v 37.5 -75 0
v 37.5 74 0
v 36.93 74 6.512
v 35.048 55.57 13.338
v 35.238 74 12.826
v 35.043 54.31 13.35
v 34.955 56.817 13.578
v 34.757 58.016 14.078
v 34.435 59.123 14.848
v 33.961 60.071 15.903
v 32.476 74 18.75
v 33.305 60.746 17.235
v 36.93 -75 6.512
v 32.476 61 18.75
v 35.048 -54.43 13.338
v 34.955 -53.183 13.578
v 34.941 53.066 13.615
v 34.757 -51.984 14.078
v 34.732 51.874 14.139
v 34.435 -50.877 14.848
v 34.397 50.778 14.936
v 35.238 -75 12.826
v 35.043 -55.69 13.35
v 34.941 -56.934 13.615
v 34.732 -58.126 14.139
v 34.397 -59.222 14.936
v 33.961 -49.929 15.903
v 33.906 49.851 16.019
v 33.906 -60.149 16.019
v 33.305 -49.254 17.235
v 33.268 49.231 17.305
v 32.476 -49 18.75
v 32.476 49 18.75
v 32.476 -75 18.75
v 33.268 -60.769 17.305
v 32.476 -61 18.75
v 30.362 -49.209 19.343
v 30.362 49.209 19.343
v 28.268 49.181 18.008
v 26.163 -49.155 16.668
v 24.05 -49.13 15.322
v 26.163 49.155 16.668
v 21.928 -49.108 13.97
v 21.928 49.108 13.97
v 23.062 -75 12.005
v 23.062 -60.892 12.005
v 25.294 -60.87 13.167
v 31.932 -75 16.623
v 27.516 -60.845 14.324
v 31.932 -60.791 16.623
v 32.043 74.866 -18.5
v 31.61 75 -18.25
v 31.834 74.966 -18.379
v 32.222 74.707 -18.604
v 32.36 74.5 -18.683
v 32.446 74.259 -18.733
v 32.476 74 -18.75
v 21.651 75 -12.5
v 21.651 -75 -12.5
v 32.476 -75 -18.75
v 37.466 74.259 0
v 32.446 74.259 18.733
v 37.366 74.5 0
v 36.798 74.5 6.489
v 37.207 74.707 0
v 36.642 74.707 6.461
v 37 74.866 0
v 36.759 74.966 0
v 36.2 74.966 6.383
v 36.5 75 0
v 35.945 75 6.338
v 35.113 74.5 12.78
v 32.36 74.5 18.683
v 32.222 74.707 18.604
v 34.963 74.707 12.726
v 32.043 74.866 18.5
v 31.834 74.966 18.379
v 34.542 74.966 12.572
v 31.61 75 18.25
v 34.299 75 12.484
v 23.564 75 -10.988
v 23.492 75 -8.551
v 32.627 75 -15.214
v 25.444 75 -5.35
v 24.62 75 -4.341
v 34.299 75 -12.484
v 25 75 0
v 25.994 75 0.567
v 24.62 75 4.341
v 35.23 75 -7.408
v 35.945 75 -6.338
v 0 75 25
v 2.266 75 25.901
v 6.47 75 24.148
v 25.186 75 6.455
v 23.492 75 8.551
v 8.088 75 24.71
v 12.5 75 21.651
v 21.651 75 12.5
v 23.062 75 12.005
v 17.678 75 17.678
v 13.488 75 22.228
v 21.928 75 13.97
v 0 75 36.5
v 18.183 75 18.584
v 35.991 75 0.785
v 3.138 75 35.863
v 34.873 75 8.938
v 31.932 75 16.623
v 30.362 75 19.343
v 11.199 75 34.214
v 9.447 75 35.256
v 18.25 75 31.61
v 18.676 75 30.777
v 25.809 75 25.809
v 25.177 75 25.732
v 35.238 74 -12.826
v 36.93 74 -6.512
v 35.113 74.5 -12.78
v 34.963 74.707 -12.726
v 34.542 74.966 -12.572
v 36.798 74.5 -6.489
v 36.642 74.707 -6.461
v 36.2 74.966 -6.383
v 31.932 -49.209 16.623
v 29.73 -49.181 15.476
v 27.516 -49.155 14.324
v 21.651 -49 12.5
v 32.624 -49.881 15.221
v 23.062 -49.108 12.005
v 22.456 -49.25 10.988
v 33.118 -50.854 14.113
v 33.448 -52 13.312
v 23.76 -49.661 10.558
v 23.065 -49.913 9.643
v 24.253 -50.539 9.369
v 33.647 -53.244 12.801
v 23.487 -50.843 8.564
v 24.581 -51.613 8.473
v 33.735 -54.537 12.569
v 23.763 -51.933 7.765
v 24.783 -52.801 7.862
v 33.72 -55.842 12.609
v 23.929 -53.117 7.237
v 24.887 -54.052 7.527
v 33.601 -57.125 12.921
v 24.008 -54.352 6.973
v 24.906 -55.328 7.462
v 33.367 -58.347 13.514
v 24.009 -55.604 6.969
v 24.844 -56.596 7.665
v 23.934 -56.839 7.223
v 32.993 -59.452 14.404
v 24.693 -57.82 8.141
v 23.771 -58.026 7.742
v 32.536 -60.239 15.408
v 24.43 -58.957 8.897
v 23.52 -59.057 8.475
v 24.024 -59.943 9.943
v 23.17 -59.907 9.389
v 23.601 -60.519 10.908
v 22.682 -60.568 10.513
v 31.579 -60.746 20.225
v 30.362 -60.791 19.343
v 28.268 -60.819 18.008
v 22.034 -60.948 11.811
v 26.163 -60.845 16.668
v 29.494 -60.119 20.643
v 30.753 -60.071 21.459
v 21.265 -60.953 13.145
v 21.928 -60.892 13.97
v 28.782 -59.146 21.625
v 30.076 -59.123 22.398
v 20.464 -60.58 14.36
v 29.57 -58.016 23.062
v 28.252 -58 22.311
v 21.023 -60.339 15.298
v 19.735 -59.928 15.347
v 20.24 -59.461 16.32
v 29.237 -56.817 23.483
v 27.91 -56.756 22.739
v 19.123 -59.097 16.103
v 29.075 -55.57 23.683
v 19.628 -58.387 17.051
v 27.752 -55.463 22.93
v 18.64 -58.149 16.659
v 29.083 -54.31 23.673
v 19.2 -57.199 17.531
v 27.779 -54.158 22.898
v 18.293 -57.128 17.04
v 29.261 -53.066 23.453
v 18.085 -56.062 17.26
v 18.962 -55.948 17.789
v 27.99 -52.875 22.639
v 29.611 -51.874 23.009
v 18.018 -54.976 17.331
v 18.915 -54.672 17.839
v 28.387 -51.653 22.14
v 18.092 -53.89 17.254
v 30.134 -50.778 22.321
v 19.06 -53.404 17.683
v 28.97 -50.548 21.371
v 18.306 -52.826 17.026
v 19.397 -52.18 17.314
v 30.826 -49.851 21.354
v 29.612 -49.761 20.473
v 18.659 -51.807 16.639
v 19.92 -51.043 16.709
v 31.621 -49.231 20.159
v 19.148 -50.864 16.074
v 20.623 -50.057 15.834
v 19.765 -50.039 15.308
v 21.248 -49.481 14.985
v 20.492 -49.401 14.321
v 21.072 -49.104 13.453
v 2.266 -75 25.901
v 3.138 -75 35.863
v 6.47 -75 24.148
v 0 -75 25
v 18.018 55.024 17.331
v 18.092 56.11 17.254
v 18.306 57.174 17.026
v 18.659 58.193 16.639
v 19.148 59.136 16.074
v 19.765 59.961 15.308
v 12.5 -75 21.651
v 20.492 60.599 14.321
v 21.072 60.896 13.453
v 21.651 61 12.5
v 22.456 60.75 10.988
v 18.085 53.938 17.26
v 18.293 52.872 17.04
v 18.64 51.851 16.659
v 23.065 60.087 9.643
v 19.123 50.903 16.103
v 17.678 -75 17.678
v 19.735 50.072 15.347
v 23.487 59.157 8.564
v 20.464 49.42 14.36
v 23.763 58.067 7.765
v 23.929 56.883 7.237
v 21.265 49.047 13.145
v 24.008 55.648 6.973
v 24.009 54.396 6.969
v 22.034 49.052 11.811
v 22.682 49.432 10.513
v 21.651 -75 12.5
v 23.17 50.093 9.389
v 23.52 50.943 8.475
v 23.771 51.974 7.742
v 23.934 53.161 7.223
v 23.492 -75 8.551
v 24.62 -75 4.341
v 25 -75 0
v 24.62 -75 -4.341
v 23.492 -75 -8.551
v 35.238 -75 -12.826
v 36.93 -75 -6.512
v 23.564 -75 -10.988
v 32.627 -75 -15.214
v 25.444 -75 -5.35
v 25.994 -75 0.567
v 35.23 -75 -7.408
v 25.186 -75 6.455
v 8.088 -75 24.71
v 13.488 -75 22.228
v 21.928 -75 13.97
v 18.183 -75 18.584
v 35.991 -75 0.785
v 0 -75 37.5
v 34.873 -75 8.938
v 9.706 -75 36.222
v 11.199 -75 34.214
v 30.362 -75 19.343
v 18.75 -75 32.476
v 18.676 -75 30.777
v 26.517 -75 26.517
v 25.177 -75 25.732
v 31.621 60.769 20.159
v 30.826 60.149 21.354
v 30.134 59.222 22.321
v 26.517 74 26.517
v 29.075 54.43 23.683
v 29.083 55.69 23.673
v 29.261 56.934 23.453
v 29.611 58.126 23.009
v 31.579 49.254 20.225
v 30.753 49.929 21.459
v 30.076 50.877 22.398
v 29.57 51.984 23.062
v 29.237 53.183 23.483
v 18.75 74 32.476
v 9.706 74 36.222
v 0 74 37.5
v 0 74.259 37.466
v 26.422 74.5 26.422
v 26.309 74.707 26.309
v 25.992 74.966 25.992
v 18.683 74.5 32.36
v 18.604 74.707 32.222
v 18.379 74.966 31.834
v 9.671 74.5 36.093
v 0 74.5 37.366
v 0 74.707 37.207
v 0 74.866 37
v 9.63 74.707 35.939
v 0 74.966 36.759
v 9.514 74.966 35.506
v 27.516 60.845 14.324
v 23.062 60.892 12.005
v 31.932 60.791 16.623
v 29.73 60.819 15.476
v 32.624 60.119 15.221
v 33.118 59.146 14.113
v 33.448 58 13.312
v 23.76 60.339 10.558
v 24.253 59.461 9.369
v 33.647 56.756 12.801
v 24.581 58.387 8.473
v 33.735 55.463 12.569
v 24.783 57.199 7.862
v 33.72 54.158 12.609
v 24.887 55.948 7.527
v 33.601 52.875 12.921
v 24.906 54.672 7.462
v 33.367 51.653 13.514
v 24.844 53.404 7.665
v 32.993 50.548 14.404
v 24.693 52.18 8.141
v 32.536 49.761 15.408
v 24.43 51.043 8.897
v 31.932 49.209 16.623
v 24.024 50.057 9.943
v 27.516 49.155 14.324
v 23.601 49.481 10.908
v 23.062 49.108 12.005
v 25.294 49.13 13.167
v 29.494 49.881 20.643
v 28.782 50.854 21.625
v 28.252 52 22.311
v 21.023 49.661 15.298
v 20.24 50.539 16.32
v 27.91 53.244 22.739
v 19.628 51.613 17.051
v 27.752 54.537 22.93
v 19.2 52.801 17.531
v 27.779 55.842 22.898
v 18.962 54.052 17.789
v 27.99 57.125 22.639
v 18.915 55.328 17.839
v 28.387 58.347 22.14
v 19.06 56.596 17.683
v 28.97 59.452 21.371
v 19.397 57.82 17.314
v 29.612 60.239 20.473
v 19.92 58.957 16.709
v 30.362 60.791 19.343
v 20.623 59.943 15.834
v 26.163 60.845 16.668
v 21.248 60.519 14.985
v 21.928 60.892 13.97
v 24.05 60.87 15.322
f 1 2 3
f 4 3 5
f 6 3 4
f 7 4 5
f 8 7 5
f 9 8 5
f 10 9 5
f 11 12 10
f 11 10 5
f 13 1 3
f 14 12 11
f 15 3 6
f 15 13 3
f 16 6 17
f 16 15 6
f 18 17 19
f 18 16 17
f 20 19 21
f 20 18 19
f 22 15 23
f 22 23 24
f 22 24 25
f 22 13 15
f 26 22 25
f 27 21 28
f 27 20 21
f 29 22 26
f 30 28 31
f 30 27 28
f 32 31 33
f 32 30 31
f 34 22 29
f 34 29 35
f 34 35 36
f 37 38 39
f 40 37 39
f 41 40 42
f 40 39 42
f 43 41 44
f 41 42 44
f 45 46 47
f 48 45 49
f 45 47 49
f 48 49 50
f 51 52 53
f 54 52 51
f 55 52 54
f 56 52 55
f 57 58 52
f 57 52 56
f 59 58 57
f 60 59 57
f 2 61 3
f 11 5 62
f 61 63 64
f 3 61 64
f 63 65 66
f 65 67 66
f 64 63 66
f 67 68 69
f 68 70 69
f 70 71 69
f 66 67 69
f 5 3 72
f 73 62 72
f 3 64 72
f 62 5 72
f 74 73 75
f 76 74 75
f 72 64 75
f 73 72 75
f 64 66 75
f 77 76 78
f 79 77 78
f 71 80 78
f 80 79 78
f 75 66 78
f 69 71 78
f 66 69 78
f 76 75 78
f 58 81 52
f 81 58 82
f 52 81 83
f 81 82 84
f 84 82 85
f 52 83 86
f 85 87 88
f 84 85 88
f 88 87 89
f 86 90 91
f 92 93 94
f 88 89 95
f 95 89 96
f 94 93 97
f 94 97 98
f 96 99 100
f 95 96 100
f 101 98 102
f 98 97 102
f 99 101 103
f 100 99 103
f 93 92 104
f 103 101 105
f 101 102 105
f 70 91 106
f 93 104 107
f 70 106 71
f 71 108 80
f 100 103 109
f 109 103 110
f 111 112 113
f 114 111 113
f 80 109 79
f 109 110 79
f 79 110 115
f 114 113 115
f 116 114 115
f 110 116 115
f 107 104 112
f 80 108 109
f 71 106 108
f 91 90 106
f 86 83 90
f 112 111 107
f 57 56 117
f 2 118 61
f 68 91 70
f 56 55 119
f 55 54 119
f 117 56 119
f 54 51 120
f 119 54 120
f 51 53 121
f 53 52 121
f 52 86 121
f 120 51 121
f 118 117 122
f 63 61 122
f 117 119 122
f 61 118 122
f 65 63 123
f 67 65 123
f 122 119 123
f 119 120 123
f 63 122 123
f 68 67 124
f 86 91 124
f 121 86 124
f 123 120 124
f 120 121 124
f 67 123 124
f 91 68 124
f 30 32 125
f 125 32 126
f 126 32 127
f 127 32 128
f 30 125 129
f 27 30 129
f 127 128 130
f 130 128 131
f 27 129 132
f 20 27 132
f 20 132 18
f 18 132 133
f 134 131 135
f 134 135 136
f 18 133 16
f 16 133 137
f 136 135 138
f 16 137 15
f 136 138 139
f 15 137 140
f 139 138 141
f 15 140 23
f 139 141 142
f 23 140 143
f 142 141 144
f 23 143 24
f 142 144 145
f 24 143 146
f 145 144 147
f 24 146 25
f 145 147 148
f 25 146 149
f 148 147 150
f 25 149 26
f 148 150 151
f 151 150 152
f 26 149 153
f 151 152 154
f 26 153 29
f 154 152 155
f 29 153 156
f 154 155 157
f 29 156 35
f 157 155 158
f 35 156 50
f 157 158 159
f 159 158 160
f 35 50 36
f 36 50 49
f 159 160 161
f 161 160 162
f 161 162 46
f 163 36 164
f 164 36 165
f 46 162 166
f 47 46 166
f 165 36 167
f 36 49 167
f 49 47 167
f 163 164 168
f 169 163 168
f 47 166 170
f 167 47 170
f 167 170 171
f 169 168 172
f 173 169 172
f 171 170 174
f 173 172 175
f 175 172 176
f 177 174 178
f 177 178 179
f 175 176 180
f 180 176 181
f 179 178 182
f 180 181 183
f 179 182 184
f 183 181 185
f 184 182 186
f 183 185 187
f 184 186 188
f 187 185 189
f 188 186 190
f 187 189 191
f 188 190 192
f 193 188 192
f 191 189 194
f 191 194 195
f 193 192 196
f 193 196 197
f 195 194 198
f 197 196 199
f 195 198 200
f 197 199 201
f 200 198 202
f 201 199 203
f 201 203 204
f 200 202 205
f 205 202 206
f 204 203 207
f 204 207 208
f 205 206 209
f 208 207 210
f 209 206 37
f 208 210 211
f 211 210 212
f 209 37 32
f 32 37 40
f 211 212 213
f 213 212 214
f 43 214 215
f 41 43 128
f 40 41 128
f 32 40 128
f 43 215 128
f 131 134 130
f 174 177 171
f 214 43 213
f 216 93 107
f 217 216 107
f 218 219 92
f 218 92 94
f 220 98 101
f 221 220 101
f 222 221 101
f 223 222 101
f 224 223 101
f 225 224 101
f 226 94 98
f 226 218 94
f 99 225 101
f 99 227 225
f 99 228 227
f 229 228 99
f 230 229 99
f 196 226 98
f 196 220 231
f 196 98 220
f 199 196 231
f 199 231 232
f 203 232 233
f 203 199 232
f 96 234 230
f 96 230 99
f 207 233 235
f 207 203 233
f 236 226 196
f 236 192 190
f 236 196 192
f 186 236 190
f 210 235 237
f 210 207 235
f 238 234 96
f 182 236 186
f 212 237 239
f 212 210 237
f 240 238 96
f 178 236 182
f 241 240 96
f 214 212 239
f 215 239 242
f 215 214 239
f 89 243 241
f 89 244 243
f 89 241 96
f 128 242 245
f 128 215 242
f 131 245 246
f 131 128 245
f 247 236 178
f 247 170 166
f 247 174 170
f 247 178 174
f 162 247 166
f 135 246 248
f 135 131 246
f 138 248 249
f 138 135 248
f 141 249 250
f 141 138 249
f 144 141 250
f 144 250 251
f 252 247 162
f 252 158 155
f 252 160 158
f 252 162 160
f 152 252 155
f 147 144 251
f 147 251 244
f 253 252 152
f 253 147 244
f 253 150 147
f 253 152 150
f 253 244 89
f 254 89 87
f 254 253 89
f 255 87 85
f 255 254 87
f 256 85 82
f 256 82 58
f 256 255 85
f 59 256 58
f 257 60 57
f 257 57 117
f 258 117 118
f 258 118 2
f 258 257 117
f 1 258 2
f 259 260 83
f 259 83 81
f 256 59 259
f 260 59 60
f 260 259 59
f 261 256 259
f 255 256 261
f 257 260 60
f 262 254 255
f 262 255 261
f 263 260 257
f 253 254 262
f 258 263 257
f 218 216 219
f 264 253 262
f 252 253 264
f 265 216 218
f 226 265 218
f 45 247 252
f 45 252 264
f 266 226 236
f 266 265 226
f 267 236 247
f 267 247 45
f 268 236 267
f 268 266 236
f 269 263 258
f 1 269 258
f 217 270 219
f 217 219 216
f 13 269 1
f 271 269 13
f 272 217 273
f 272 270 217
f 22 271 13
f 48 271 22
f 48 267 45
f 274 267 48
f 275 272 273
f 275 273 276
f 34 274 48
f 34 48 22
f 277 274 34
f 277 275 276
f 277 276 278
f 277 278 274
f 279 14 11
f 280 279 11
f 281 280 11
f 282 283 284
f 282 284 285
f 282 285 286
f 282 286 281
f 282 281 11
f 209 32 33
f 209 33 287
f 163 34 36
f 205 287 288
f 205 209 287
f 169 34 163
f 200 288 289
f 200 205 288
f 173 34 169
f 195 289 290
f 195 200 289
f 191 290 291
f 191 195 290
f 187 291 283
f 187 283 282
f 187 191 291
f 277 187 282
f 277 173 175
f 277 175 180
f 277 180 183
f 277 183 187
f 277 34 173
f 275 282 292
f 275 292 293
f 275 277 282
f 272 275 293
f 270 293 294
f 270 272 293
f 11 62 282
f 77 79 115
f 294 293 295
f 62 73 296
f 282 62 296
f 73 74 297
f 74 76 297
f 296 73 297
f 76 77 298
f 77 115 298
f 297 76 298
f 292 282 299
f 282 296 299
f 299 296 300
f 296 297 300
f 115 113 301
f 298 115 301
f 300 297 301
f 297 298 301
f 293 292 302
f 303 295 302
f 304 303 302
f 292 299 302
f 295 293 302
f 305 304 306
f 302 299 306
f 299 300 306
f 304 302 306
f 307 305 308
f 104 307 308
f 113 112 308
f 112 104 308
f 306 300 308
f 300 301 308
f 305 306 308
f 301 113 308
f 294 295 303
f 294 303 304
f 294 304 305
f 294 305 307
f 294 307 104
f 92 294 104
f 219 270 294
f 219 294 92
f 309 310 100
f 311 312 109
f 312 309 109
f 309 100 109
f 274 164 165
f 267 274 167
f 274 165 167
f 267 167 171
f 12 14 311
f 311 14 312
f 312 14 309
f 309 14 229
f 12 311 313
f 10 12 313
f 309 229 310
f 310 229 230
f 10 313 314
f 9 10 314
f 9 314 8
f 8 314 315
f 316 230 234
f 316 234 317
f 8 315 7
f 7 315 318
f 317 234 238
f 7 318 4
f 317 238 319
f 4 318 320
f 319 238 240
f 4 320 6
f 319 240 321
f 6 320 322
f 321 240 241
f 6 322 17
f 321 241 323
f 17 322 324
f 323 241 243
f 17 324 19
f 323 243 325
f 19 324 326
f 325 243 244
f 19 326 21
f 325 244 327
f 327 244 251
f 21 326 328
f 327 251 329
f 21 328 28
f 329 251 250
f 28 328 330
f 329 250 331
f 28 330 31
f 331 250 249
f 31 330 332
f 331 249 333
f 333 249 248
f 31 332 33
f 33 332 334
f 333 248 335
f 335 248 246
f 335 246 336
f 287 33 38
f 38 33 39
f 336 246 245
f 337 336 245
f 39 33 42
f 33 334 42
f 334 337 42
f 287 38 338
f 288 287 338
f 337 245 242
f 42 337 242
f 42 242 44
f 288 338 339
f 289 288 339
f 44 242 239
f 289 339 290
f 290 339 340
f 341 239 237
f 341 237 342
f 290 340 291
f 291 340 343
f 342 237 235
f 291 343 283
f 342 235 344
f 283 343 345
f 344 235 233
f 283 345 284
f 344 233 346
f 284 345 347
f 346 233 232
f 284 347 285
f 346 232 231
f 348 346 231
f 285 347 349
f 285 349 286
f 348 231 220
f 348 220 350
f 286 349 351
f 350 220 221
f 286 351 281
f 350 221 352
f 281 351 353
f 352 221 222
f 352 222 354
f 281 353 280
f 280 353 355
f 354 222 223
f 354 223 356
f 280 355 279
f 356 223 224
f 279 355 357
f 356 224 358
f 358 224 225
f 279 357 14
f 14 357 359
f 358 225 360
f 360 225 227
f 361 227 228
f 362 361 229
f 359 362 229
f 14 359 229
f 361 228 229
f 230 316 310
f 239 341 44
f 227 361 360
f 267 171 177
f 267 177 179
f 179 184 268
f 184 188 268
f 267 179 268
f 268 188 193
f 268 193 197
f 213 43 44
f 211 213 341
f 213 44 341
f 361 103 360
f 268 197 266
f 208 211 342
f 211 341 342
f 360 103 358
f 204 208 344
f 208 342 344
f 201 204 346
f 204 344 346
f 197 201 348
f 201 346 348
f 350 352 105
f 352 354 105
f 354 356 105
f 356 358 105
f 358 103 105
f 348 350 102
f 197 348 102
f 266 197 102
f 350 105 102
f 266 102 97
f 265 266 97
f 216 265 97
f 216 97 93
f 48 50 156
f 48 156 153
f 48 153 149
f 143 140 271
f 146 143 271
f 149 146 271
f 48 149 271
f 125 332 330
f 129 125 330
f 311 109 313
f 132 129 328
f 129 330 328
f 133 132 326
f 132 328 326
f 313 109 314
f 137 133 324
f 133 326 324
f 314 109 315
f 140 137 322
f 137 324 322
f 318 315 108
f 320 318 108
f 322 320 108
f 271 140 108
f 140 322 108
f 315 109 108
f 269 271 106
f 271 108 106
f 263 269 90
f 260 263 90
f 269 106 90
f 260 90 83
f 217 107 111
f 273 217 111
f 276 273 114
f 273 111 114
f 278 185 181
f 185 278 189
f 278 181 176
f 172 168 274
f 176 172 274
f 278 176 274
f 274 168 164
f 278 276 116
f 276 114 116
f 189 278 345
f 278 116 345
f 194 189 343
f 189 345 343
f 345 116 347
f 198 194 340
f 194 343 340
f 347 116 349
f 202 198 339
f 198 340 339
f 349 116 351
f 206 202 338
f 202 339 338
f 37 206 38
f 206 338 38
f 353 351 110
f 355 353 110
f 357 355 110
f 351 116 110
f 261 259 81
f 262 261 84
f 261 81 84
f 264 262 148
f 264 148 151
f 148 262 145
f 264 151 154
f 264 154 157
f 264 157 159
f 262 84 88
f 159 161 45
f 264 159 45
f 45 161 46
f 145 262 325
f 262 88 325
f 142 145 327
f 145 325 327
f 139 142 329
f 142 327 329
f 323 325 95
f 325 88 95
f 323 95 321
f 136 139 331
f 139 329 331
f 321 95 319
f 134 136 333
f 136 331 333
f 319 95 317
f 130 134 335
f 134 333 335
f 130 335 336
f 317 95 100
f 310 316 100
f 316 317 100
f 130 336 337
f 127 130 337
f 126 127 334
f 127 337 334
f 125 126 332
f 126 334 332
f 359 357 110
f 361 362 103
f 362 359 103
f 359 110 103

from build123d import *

# Parameters (mm, degrees)
F1_DEPTH = 75
F5_D     = 12
F7_DEPTH = 150
F8_R     = 1


with BuildPart() as f1:
    # F0 (on Front) → F1 (new body, symmetric)
    with BuildSketch(Plane.XZ):
        with BuildLine():
            Line((21.6506350946, 12.5), (32.4759526419, 18.75))
            ThreePointArc((32.4759526419, 18.75), (18.75, 32.4759526419), (0, 37.5))
            Line((0, 37.5), (0, 25))
            ThreePointArc((0, 25), (12.5, 21.6506350946), (21.6506350946, 12.5))
        make_face()
        with BuildLine():
            ThreePointArc((32.4759526419, -18.75), (36.2222184858, -9.7057141913), (37.5, 0))
            ThreePointArc((37.5, 0), (36.2222184858, 9.7057141913), (32.4759526419, 18.75))
            Line((32.4759526419, 18.75), (21.6506350946, 12.5))
            ThreePointArc((21.6506350946, 12.5), (24.1481456572, 6.4704761276), (25, 0))
            ThreePointArc((25, 0), (24.1481456572, -6.4704761276), (21.6506350946, -12.5))
            Line((21.6506350946, -12.5), (32.4759526419, -18.75))
        make_face()
    extrude(amount=F1_DEPTH, both=True)

    # F5 (through all)
    with Locations(Plane(origin=(33.5584843966, 0, 19.375), x_dir=(0, -1, 0), z_dir=(0.8660254038, 0, 0.5))):
        with Locations((55, 0), (-55, 0)):
            Hole(F5_D / 2)

    # F6 (on face) → F7 (cut)
    with BuildSketch(Plane(origin=(0, 75, 0), x_dir=(-1, 0, 0), z_dir=(0, 1, 0))):
        with BuildLine():
            ThreePointArc((-21.9281775911, 13.969789817), (-13.4881047122, 22.2277086375), (-2.2660493114, 25.9010621504))
            Line((-2.2660493114, 25.9010621504), (-3.1376067389, 35.8630091313))
            ThreePointArc((-3.1376067389, 35.8630091313), (-18.6758372938, 30.7768273442), (-30.3620920493, 19.3427859005))
            Line((-30.3620920493, 19.3427859005), (-21.9281775911, 13.969789817))
        make_face()
        with BuildLine():
            ThreePointArc((-23.564002463, -10.9880748053), (-25.9938127041, 0.5671870109), (-23.0622816626, 12.0054639441))
            Line((-23.0622816626, 12.0054639441), (-31.9323899944, 16.6229500765))
            ThreePointArc((-31.9323899944, 16.6229500765), (-35.9914329749, 0.7853358612), (-32.6270803333, -15.2142574227))
            Line((-32.6270803333, -15.2142574227), (-23.564002463, -10.9880748053))
        make_face()
    extrude(amount=-F7_DEPTH, mode=Mode.SUBTRACT)

    # F8
    f8_edges = [f1.edges().sort_by_distance(p)[0] for p in [
        (32.475953, 75, 18.75),
    ]]
    fillet(f8_edges, radius=F8_R)


solid = f1.part
